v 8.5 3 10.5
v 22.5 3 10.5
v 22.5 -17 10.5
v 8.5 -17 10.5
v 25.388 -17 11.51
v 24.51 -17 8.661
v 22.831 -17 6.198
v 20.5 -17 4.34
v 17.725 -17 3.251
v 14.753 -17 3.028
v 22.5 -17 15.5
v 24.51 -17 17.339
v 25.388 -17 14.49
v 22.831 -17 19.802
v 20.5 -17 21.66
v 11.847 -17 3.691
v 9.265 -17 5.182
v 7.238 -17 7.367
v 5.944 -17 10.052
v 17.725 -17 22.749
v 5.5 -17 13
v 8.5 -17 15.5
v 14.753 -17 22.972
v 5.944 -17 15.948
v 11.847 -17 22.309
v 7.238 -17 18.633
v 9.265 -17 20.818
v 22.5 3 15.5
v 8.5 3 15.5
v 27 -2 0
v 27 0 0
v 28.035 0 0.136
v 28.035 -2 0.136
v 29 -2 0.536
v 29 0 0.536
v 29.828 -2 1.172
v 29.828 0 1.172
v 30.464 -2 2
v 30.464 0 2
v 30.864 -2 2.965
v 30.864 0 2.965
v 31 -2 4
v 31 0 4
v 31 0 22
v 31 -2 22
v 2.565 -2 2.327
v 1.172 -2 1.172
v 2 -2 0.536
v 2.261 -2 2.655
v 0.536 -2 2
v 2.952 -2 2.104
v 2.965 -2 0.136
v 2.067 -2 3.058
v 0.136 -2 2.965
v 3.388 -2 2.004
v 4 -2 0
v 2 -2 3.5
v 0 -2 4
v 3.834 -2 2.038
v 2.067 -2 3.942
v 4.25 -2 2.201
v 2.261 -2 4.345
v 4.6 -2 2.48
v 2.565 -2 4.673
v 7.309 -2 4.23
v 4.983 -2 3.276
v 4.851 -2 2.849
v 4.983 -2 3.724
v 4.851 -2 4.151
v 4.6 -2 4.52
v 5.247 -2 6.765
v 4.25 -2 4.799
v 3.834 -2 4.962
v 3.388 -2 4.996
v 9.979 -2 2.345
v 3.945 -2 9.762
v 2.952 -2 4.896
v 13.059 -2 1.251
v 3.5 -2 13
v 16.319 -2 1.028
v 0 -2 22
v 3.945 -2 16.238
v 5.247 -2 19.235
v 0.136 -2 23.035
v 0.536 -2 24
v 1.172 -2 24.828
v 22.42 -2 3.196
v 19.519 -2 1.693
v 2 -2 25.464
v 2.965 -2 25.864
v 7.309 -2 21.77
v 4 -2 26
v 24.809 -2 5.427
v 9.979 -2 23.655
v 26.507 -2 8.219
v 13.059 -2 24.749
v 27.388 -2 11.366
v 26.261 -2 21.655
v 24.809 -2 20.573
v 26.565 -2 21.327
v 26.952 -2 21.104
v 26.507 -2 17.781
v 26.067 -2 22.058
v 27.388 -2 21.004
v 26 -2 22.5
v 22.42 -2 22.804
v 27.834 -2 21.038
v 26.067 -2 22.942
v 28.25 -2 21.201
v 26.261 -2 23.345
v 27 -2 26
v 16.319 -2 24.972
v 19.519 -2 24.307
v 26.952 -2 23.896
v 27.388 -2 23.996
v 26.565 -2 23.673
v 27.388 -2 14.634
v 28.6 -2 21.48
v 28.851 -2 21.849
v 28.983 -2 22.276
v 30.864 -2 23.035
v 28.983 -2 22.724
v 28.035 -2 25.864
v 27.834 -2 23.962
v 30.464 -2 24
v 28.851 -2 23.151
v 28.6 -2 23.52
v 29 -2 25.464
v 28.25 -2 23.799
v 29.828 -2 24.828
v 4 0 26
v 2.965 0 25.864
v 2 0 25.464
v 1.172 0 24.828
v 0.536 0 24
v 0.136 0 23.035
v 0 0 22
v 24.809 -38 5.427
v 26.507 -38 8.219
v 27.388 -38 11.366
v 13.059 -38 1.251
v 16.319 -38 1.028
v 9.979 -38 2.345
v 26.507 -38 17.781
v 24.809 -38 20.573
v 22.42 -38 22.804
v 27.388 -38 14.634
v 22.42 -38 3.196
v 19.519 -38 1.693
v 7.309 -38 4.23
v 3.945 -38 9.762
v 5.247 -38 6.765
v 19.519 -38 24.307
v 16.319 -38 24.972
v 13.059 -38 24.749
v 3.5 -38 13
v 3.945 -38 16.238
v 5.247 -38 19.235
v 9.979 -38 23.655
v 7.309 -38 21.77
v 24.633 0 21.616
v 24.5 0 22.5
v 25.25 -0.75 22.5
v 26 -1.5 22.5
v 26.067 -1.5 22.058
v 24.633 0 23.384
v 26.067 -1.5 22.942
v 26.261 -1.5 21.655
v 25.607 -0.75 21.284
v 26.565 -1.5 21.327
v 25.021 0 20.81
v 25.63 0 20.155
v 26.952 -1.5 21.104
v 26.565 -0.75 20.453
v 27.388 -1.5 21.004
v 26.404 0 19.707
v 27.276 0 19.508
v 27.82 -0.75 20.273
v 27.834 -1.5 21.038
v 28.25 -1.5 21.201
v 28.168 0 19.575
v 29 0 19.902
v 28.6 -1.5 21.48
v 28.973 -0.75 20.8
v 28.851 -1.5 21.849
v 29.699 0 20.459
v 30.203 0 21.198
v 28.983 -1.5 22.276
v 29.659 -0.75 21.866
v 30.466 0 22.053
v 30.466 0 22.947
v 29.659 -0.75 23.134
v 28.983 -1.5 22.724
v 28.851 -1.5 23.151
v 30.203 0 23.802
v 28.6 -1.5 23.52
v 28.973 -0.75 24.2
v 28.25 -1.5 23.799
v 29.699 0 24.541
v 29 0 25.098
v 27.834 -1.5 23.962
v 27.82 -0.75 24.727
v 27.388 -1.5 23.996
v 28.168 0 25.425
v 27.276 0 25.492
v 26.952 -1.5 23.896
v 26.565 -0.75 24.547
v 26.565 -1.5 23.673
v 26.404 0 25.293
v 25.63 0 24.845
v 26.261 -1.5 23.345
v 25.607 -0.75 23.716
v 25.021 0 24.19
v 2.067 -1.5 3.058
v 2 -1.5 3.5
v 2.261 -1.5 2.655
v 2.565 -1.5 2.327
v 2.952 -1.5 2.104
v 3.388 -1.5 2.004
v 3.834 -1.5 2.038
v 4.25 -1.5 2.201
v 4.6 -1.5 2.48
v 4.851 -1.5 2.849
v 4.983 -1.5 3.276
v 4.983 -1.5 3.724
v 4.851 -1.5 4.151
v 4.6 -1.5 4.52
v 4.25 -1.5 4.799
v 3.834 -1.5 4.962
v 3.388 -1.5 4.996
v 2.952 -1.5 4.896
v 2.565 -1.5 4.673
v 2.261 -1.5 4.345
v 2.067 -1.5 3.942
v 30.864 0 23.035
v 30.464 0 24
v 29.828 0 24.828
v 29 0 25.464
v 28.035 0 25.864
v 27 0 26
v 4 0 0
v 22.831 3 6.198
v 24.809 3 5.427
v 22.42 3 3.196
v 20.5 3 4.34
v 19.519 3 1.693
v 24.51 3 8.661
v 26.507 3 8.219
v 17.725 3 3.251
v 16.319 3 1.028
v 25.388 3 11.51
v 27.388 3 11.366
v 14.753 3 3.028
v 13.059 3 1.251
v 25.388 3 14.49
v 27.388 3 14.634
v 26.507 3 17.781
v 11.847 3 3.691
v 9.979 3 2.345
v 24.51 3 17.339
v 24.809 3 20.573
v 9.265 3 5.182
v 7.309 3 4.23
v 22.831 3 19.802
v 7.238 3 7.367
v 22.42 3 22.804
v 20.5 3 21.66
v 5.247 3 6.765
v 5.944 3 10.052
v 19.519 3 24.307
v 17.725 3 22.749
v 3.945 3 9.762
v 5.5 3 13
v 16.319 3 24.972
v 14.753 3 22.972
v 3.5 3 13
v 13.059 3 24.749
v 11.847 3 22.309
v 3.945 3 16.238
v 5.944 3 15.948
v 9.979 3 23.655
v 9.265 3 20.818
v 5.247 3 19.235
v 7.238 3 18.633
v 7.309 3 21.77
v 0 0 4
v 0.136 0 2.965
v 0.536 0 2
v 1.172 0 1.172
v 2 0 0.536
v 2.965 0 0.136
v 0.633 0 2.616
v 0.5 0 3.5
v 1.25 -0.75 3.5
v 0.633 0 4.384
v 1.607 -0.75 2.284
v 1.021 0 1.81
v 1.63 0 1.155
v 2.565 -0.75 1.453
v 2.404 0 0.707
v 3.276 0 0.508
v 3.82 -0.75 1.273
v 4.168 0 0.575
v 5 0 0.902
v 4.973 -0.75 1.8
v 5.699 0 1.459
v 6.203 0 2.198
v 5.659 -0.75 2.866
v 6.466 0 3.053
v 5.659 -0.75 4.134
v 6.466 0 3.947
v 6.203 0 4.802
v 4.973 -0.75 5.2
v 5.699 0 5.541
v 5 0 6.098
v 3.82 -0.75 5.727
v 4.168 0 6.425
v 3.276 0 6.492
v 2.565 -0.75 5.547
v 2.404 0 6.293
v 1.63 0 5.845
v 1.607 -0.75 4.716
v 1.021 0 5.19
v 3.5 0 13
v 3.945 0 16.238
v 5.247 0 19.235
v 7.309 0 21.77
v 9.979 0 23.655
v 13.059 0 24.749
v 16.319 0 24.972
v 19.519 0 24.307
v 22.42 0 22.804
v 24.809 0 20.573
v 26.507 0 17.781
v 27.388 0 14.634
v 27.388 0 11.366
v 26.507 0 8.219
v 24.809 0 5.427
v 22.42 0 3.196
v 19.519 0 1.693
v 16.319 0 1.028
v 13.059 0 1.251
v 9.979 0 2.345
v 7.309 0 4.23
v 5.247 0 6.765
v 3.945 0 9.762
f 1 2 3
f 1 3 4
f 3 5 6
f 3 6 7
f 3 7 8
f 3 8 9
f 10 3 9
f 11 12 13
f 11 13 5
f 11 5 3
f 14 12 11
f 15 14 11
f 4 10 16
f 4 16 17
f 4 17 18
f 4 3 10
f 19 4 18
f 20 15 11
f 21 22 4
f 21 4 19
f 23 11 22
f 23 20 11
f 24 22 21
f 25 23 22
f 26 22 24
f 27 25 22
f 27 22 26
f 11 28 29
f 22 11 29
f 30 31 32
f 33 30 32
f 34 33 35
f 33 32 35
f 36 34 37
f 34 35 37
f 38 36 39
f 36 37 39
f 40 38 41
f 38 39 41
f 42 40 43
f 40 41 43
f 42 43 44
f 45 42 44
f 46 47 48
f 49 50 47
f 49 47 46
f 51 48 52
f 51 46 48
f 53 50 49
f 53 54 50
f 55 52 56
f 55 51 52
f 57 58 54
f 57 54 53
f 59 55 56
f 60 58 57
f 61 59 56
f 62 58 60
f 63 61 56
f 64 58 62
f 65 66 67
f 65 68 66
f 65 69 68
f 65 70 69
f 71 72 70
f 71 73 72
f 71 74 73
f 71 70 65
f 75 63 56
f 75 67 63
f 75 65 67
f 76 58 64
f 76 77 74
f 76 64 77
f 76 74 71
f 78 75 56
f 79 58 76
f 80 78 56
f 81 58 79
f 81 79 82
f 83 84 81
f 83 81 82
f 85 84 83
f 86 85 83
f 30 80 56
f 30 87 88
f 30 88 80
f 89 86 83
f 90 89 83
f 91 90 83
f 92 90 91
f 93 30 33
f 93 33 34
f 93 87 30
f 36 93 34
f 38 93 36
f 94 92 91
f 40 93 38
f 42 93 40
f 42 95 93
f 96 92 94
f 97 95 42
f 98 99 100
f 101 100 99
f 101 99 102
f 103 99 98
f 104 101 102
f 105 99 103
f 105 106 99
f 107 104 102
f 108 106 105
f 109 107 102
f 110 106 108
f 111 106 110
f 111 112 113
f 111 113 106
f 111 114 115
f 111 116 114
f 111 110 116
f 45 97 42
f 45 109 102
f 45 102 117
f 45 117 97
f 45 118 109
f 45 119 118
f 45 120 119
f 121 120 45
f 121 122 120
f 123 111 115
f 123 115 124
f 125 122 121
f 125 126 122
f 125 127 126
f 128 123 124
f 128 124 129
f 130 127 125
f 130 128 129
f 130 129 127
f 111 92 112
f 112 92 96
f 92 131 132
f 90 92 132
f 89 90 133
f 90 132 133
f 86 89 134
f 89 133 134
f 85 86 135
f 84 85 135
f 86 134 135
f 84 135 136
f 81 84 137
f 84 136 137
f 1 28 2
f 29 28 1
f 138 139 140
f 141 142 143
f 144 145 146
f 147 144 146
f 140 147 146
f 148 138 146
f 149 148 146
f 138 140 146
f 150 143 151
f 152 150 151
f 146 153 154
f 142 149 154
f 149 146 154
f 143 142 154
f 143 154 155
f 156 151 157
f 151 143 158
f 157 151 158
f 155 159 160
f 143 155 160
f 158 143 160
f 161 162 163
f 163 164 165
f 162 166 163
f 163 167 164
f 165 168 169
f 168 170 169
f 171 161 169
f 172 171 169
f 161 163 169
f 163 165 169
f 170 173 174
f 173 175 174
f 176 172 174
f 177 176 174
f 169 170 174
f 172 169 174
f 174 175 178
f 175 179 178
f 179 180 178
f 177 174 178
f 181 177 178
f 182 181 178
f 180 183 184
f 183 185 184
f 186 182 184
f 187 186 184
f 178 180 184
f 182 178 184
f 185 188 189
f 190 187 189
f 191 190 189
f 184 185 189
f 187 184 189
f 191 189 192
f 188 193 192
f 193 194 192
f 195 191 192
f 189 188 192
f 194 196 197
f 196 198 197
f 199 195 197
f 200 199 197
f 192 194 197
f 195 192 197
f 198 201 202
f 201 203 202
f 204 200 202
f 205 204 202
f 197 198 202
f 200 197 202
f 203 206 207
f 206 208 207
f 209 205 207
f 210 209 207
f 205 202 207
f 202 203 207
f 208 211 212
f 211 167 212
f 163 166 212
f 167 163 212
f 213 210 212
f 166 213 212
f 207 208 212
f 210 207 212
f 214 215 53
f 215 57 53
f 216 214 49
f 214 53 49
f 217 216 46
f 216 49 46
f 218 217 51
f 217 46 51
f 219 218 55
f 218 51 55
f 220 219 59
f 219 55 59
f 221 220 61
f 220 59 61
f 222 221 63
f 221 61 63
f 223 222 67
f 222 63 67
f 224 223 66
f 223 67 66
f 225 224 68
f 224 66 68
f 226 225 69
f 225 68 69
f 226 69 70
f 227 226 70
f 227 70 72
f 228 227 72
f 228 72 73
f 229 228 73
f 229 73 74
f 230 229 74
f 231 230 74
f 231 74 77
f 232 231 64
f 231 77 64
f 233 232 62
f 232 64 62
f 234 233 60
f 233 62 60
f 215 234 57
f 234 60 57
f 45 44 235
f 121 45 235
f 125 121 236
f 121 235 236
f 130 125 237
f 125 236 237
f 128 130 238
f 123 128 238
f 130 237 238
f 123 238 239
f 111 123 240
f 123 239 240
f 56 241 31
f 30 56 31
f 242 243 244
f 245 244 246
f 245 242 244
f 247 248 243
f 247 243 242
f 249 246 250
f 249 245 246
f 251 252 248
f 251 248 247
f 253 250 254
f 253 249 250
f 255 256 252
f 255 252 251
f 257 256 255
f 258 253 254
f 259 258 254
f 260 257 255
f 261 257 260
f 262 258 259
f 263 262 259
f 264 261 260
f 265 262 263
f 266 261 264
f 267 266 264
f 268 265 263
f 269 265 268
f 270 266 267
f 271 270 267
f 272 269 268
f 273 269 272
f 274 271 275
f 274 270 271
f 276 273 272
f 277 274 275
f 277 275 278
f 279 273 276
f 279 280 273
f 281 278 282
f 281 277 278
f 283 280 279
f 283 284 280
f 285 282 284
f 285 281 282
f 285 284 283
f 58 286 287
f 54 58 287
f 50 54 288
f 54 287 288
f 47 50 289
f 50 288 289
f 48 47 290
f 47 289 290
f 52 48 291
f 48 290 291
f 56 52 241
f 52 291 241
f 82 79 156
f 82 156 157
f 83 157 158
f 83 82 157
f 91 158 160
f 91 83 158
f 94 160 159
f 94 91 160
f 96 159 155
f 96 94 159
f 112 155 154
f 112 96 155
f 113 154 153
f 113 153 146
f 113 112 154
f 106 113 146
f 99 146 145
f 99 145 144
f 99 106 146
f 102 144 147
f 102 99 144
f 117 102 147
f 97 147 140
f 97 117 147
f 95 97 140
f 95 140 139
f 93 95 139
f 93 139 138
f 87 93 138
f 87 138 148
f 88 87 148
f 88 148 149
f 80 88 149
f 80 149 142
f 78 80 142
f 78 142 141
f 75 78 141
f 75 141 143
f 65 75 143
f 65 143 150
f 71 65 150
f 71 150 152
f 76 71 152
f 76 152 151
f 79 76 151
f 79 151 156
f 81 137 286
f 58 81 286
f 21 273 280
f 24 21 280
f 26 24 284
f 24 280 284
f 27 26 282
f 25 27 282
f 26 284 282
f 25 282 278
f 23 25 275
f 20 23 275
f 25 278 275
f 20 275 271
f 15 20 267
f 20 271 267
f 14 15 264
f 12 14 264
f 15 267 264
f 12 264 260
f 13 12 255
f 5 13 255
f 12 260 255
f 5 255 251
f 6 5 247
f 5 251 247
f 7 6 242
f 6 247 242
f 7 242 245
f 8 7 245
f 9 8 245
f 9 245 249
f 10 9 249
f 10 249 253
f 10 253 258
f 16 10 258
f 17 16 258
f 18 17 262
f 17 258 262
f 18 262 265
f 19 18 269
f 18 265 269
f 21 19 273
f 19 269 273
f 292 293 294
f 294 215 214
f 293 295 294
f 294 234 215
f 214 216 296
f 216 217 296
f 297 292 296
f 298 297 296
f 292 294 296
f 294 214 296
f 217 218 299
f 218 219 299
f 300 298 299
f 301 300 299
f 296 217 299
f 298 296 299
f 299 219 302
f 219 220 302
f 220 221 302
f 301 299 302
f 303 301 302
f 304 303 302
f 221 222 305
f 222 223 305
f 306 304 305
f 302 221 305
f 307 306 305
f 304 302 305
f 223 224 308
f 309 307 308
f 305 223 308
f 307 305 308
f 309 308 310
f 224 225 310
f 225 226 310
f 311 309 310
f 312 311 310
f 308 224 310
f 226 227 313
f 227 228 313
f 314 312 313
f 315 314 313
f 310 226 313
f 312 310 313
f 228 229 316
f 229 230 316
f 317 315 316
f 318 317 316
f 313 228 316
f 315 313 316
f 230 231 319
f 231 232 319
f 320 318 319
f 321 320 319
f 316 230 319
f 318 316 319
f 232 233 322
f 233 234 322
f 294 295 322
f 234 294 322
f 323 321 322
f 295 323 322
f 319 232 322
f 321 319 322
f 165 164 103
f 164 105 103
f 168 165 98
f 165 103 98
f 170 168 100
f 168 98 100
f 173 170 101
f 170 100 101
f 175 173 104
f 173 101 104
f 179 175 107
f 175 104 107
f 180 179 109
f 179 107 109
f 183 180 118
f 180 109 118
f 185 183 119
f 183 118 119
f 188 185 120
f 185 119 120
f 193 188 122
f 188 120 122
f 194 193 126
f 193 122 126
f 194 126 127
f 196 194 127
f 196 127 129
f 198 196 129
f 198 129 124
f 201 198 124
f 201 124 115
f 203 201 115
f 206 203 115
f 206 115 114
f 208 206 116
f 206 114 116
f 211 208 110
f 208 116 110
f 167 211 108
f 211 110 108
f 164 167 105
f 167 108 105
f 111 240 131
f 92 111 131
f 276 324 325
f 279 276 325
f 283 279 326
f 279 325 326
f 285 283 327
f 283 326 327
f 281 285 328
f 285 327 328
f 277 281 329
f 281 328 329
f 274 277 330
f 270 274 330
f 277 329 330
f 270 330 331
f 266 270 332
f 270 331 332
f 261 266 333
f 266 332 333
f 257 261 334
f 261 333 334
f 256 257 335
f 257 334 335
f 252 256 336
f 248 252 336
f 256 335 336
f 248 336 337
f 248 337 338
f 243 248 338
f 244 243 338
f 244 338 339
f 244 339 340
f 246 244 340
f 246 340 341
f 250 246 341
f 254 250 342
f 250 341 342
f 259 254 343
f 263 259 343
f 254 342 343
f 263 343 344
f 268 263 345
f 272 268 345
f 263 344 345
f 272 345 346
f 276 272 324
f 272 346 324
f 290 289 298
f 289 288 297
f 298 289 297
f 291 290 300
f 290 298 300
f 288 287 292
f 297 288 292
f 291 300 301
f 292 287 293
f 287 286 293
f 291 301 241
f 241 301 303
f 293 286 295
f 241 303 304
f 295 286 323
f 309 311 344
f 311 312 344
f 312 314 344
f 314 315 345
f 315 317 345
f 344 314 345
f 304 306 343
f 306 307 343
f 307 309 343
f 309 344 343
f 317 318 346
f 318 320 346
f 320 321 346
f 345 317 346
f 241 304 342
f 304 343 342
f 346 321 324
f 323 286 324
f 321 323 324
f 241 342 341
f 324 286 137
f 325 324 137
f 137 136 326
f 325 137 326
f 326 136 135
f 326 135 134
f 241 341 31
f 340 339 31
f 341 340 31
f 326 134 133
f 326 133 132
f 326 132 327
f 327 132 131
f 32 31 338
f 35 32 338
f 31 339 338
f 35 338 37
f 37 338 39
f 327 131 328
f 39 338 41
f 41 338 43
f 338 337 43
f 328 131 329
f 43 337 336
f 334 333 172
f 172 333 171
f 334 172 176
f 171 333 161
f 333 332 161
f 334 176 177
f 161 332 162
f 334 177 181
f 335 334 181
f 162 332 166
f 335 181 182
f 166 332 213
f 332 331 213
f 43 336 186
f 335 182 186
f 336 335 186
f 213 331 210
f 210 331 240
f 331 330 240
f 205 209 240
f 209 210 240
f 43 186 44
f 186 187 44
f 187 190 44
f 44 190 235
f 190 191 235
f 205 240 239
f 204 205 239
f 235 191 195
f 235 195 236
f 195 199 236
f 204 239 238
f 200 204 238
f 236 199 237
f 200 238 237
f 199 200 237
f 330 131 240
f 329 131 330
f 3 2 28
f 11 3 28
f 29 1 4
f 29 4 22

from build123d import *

# Parameters (mm, degrees)
F1_DEPTH       = 2
F2_D           = 3
F2_CSINK_D     = 6
F2_CSINK_ANGLE = 90
F3_R           = 12
F4_DEPTH       = 3
F5_DEPTH       = 38
F6_R           = 10
F6_W           = 14
F6_H           = 5
F7_DEPTH       = 20


with BuildPart() as f1:
    # F0 (on Front) → F1 (new body)
    with BuildSketch(Plane.XZ):
        with BuildLine():
            ThreePointArc((0, 4), (1.1715728753, 1.1715728753), (4, 0))
            Line((4, 0), (27, 0))
            ThreePointArc((27, 0), (29.8284271247, 1.1715728753), (31, 4))
            Line((31, 4), (31, 22))
            ThreePointArc((31, 22), (29.8284271247, 24.8284271247), (27, 26))
            Line((27, 26), (4, 26))
            ThreePointArc((4, 26), (1.1715728753, 24.8284271247), (0, 22))
            Line((0, 22), (0, 4))
        make_face()
    extrude(amount=F1_DEPTH)

    # F2 (through all)
    with Locations(Plane(origin=(0, 0, 0), x_dir=(1, 0, 0), z_dir=(0, 1, 0))):
        with Locations((27.5, -22.5), (3.5, -3.5)):
            CounterSinkHole(F2_D / 2, F2_CSINK_D / 2, counter_sink_angle=F2_CSINK_ANGLE)

    # F3 (on face) → F4 (join)
    with BuildSketch(Plane(origin=(0, 0, 0), x_dir=(-1, 0, 0), z_dir=(0, 1, 0))):
        with Locations((-15.5, 13)):
            Circle(F3_R)
    extrude(amount=F4_DEPTH)

    # F3 (on face) → F5 (join)
    with BuildSketch(Plane(origin=(0, 0, 0), x_dir=(-1, 0, 0), z_dir=(0, 1, 0))):
        with Locations((-15.5, 13)):
            Circle(F3_R)
    extrude(amount=-F5_DEPTH)

    # F6 (on face) → F7 (cut)
    with BuildSketch(Plane(origin=(0, 3, 0), x_dir=(-1, 0, 0), z_dir=(0, 1, 0))):
        with Locations((-15.5, 13)):
            Circle(F6_R)
        with Locations((-15.5, 13)):
            Rectangle(F6_W, F6_H, mode=Mode.SUBTRACT)
    extrude(amount=-F7_DEPTH, mode=Mode.SUBTRACT)


solid = f1.part
